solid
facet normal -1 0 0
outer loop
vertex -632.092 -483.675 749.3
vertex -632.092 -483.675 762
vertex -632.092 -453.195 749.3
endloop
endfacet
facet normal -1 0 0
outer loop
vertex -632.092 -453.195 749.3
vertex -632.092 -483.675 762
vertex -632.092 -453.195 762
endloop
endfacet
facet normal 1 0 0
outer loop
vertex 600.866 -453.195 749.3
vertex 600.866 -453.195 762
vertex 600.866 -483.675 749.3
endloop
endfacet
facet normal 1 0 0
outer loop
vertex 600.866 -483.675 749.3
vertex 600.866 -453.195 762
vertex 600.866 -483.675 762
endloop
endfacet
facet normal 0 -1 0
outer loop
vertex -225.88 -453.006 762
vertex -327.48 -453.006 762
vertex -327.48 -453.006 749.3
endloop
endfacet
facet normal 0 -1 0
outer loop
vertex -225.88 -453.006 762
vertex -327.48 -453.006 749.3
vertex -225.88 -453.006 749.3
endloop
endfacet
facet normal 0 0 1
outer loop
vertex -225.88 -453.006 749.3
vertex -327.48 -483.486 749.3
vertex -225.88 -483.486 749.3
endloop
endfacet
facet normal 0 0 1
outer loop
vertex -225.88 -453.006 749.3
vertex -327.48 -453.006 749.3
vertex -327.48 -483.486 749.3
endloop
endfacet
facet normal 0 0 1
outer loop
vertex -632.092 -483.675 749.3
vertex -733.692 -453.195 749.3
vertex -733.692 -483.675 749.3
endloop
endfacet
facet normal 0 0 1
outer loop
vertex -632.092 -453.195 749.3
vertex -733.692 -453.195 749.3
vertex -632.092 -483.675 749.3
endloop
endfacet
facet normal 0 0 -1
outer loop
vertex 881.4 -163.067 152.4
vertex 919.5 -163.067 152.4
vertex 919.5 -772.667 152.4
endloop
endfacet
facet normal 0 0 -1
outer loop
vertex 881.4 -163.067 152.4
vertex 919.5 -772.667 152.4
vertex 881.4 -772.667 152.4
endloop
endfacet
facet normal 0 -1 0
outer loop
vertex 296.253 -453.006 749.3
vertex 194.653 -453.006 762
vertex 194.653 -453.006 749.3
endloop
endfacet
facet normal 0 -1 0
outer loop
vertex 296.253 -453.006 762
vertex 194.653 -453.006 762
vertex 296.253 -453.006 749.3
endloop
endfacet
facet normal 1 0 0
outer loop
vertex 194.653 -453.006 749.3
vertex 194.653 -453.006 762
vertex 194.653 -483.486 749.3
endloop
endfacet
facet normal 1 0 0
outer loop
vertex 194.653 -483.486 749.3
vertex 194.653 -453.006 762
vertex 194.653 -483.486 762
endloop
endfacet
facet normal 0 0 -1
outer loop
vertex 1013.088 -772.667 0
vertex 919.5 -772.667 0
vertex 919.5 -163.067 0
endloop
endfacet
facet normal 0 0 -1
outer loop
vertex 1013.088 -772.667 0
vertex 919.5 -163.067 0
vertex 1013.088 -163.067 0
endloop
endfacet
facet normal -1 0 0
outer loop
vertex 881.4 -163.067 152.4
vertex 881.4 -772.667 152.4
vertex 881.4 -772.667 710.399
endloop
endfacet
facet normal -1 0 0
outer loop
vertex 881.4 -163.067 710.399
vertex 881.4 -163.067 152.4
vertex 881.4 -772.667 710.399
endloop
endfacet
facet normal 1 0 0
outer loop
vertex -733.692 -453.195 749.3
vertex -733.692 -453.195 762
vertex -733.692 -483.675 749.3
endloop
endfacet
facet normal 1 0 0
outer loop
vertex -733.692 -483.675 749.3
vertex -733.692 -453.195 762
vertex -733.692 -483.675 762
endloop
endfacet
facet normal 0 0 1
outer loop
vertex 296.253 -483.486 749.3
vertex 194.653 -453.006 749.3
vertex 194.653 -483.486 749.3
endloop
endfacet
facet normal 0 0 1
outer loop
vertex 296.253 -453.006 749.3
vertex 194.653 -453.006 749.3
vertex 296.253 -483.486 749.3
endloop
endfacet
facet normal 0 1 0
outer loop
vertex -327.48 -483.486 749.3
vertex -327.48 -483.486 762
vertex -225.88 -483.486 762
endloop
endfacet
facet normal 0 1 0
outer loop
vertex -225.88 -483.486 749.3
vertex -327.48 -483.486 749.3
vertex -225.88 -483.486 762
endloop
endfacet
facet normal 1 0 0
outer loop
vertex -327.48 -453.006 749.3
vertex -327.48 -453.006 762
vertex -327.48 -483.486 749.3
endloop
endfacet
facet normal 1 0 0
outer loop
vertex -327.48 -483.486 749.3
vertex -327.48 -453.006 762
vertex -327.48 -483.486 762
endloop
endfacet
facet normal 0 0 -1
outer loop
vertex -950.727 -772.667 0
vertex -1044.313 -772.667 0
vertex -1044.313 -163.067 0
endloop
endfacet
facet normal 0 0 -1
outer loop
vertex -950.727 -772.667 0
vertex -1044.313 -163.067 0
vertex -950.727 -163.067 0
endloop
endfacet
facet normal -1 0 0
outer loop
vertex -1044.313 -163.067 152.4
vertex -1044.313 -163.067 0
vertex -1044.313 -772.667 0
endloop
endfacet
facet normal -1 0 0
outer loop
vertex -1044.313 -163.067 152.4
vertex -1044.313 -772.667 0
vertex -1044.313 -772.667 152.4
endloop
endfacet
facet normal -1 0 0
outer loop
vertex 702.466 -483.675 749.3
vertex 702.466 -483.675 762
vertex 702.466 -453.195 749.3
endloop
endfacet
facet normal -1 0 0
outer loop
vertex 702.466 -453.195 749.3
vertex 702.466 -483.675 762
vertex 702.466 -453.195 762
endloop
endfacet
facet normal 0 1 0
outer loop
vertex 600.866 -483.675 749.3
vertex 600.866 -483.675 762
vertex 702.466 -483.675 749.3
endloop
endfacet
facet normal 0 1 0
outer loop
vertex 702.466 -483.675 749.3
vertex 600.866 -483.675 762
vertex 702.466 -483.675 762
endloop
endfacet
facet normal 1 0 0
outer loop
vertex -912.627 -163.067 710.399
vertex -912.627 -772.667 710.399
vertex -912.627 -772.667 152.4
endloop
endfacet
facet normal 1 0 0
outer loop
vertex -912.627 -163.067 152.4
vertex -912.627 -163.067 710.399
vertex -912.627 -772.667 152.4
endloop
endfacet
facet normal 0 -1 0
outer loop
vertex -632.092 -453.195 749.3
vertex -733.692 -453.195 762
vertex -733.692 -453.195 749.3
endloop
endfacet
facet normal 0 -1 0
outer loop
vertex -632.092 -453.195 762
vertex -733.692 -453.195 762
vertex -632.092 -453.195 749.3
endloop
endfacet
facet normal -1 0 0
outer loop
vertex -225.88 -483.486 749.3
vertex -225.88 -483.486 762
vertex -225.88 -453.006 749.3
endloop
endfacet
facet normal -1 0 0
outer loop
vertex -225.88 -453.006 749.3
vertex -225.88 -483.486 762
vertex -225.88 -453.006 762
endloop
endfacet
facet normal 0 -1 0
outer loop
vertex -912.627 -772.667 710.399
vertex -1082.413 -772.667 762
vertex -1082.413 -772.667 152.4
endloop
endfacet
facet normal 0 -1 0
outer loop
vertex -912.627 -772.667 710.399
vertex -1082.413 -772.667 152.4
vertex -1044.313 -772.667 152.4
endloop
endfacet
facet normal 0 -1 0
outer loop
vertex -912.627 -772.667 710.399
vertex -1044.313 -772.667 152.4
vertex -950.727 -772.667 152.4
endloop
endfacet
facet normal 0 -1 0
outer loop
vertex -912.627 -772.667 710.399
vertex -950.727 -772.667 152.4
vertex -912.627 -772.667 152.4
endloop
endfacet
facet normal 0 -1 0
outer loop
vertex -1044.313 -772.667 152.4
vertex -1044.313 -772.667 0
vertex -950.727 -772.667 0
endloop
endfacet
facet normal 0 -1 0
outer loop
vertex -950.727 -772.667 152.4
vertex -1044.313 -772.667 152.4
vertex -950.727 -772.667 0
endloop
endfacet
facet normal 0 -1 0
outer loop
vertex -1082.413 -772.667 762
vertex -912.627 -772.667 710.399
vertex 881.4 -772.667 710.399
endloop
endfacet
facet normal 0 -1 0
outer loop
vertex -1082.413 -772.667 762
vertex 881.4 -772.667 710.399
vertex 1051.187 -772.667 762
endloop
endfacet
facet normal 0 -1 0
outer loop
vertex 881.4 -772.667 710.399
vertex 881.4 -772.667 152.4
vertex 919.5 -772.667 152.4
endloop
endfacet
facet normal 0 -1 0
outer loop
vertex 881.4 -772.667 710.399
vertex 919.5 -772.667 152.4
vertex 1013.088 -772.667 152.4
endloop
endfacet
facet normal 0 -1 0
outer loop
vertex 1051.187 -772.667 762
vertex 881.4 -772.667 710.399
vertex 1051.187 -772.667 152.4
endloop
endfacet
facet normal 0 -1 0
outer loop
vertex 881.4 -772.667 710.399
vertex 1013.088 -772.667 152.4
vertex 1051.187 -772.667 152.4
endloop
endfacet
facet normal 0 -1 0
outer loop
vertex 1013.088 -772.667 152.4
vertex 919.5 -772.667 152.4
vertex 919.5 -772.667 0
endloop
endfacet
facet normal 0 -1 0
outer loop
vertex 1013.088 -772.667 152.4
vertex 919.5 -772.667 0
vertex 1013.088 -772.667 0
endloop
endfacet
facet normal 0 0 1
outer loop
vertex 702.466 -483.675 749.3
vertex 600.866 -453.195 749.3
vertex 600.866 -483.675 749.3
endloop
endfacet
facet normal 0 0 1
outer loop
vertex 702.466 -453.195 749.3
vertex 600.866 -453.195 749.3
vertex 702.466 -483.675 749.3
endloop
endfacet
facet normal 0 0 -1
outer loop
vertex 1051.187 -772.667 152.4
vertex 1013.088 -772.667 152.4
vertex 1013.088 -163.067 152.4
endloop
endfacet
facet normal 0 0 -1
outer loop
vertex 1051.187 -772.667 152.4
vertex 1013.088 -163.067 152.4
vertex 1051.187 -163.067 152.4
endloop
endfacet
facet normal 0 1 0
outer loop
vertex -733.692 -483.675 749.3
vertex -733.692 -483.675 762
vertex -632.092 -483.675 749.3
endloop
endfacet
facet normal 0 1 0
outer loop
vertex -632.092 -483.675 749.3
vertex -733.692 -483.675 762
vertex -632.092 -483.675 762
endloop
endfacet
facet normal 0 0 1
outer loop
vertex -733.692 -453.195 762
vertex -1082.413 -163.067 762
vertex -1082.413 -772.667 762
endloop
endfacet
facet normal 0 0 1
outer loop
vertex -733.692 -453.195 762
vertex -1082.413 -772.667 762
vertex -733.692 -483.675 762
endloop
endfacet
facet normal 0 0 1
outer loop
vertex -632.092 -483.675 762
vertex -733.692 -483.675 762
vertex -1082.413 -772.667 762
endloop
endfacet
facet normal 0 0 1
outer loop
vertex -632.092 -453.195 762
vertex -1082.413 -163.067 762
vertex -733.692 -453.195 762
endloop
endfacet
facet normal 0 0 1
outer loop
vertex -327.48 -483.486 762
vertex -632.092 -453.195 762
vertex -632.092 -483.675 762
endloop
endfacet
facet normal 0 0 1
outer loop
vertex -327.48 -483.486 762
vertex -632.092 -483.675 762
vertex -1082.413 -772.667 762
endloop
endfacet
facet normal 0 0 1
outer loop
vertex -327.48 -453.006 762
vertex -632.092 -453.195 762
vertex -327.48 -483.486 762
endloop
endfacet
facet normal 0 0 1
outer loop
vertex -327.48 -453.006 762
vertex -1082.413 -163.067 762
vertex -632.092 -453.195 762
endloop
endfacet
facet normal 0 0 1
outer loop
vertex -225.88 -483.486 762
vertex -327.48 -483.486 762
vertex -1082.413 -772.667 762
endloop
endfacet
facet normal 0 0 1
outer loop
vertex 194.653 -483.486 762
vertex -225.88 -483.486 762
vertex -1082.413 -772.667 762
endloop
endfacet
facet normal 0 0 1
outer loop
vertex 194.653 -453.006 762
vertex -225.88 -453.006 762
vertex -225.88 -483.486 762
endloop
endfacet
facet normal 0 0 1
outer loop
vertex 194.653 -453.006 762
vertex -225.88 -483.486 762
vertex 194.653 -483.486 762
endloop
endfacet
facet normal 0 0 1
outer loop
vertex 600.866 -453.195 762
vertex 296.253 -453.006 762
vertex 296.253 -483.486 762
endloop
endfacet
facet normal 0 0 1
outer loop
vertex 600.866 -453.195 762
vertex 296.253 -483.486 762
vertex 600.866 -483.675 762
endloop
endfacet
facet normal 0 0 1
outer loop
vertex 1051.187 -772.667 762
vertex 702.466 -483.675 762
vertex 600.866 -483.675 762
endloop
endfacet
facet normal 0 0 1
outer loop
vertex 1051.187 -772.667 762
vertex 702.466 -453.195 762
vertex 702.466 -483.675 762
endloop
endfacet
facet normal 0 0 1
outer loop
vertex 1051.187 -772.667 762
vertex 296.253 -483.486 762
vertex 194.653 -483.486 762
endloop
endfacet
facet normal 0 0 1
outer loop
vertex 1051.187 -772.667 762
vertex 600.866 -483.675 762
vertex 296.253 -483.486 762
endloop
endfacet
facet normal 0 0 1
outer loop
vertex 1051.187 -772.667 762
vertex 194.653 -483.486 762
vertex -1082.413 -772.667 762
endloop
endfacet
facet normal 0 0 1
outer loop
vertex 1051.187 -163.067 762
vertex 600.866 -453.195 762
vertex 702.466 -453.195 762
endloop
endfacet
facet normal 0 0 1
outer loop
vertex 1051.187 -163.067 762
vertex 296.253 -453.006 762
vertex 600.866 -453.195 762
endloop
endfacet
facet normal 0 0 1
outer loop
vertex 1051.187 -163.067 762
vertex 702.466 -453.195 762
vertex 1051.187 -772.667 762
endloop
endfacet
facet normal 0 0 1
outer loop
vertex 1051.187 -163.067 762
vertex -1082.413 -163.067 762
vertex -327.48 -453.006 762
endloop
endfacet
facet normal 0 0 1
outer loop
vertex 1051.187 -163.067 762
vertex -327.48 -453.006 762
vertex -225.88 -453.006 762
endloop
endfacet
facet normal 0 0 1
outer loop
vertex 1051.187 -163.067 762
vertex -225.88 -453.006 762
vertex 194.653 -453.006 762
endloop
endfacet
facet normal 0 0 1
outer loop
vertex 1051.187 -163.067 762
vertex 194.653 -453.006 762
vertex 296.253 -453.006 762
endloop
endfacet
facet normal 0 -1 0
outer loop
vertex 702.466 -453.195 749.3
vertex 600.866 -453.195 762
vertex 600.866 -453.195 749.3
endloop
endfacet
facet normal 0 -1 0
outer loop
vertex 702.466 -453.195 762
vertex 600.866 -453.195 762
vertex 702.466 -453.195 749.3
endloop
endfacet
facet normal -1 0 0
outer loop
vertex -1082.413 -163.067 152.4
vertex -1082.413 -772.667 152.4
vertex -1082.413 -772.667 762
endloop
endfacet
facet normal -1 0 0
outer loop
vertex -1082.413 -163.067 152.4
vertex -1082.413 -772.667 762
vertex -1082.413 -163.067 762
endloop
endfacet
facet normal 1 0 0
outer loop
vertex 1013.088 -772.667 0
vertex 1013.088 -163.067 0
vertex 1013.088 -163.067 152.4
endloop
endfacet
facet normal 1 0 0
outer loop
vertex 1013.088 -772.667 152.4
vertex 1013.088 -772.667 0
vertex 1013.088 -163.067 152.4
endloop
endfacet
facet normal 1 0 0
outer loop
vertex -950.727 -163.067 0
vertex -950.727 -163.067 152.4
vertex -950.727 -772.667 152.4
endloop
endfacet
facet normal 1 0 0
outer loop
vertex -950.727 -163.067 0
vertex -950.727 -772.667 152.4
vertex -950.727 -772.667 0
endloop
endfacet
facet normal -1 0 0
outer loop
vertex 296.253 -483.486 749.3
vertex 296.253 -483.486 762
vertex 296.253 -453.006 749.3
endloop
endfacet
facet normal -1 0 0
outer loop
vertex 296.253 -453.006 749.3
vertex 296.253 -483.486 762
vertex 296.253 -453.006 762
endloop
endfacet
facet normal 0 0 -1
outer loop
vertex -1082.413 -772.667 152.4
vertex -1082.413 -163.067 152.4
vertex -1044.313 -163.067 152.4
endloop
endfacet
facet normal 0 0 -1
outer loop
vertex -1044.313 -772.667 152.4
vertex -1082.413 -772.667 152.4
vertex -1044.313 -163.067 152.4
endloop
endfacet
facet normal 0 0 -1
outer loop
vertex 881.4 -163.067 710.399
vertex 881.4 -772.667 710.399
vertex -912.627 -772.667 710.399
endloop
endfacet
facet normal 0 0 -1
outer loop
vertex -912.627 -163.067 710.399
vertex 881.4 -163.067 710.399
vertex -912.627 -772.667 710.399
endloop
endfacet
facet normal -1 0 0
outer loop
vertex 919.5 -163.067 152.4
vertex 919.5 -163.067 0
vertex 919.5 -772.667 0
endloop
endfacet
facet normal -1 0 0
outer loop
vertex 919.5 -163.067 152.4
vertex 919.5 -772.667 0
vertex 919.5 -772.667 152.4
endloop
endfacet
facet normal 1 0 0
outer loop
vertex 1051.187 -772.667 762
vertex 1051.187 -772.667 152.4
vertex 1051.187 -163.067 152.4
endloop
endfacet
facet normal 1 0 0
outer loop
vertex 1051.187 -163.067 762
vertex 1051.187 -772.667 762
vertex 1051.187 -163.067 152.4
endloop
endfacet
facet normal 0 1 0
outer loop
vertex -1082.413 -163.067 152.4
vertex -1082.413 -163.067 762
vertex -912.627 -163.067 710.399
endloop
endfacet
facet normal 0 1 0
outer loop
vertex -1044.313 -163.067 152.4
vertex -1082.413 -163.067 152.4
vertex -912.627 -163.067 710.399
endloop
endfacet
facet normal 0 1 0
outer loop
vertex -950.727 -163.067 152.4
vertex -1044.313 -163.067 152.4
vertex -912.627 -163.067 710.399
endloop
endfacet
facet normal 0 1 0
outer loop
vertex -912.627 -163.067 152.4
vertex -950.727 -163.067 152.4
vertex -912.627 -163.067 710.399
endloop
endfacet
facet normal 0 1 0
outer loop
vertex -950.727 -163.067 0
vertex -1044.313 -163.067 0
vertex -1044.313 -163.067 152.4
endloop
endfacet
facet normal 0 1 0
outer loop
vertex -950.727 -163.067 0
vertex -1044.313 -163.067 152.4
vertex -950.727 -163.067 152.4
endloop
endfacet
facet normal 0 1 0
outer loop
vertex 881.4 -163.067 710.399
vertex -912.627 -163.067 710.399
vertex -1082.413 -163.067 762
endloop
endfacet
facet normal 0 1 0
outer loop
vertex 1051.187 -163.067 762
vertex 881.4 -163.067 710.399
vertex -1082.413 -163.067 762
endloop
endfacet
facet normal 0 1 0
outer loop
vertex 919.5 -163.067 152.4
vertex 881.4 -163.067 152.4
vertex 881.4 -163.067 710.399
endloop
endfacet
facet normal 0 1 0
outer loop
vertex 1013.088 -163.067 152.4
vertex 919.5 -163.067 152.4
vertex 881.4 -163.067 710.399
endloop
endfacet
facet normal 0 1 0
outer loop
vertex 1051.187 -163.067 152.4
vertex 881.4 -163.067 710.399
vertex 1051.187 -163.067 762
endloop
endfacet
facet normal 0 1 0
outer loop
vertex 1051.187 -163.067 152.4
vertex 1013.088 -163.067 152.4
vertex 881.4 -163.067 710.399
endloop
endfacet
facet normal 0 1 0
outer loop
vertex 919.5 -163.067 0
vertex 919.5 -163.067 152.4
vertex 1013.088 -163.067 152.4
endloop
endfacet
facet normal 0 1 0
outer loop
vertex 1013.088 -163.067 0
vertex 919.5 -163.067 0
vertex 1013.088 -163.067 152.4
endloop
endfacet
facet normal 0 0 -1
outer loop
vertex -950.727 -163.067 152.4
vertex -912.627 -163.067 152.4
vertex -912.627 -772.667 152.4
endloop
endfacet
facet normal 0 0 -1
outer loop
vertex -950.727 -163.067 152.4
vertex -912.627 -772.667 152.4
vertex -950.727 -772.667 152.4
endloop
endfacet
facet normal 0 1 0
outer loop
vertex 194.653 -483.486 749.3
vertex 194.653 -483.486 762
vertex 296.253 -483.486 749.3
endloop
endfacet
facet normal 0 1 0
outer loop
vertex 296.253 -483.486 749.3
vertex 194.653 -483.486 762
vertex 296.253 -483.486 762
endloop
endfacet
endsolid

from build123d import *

# Parameters (mm, degrees)
F0_W     = 2133.6
F0_H     = 609.6
F1_DEPTH = 762
F3_DEPTH = 15240
F2_W     = 38.1
F2_H     = 152.4
F4_DEPTH = 1270
F2_W_2   = 38.0986694649
F5_DEPTH = 1270
F6_W     = 101.6
F6_H     = 14.6726144286
F6_H_2   = 15.8073855714
F6_H_3   = 15.6187368706
F6_H_4   = 14.8612631294
F7_DEPTH = 12.7


with BuildPart() as f1:
    # F0 (on Top) → F1 (new body)
    with BuildSketch(Plane.XY):
        with Locations((-15.6133426353, -467.8674386665)):
            Rectangle(F0_W, F0_H)
    extrude(amount=F1_DEPTH)

    # F2 (on face) → F3 (cut)
    with BuildSketch(Plane.XZ.offset(772.6674386665)):
        Polygon((-950.7269263268, 152.4), (-950.7269263268, 0), (-15.6133426353, 0), (-15.6133426353, 710.3988881946), (-912.6269263268, 710.3988881946), (-912.6269263268, 152.4), align=None)
        Polygon((881.4002410561, 710.3988881946), (-15.6133426353, 710.3988881946), (-15.6133426353, 0), (919.5002410561, 0), (919.5002410561, 152.4), (881.4002410561, 152.4), align=None)
    extrude(amount=-F3_DEPTH, mode=Mode.SUBTRACT)

    # F2 (on face) → F4 (cut)
    with BuildSketch(Plane.XZ.offset(772.6674386665)):
        Polygon((-950.7269263268, 152.4), (-950.7269263268, 0), (-15.6133426353, 0), (-15.6133426353, 710.3988881946), (-912.6269263268, 710.3988881946), (-912.6269263268, 152.4), align=None)
        with Locations((-1063.3633426353, 76.2)):
            Rectangle(F2_W, F2_H)
        Polygon((-15.6133426353, 710.3988881946), (-15.6133426353, 0), (919.5002410561, 0), (919.5002410561, 152.4), (881.4002410561, 152.4), (881.4002410561, 710.3988881946), align=None)
    extrude(amount=-F4_DEPTH, mode=Mode.SUBTRACT)

    # F2 (on face) → F5 (cut)
    with BuildSketch(Plane.XZ.offset(772.6674386665)):
        with Locations((-1063.3633426353, 76.2)):
            Rectangle(F2_W, F2_H)
        with Locations((1032.1373226322, 76.2)):
            Rectangle(F2_W_2, F2_H)
    extrude(amount=-F5_DEPTH, mode=Mode.SUBTRACT)

    # F6 (on face) → F7 (cut)
    with BuildSketch(Plane.XY.offset(762)):
        with Locations((-682.8922287941, -460.5311314521)):
            Rectangle(F6_W, F6_H)
        with Locations((-682.8922287941, -475.7711314521)):
            Rectangle(F6_W, F6_H_2)
        with Locations((-276.6795860052, -475.6768071018)):
            Rectangle(F6_W, F6_H_3)
        with Locations((-276.6795860052, -460.4368071018)):
            Rectangle(F6_W, F6_H_4)
        with Locations((245.4529007345, -475.6768071018)):
            Rectangle(F6_W, F6_H_3)
        with Locations((245.4529007345, -460.4368071018)):
            Rectangle(F6_W, F6_H_4)
        with Locations((651.6655435234, -475.7711314521)):
            Rectangle(F6_W, F6_H_2)
        with Locations((651.6655435234, -460.5311314521)):
            Rectangle(F6_W, F6_H)
    extrude(amount=-F7_DEPTH, mode=Mode.SUBTRACT)


solid = f1.part
